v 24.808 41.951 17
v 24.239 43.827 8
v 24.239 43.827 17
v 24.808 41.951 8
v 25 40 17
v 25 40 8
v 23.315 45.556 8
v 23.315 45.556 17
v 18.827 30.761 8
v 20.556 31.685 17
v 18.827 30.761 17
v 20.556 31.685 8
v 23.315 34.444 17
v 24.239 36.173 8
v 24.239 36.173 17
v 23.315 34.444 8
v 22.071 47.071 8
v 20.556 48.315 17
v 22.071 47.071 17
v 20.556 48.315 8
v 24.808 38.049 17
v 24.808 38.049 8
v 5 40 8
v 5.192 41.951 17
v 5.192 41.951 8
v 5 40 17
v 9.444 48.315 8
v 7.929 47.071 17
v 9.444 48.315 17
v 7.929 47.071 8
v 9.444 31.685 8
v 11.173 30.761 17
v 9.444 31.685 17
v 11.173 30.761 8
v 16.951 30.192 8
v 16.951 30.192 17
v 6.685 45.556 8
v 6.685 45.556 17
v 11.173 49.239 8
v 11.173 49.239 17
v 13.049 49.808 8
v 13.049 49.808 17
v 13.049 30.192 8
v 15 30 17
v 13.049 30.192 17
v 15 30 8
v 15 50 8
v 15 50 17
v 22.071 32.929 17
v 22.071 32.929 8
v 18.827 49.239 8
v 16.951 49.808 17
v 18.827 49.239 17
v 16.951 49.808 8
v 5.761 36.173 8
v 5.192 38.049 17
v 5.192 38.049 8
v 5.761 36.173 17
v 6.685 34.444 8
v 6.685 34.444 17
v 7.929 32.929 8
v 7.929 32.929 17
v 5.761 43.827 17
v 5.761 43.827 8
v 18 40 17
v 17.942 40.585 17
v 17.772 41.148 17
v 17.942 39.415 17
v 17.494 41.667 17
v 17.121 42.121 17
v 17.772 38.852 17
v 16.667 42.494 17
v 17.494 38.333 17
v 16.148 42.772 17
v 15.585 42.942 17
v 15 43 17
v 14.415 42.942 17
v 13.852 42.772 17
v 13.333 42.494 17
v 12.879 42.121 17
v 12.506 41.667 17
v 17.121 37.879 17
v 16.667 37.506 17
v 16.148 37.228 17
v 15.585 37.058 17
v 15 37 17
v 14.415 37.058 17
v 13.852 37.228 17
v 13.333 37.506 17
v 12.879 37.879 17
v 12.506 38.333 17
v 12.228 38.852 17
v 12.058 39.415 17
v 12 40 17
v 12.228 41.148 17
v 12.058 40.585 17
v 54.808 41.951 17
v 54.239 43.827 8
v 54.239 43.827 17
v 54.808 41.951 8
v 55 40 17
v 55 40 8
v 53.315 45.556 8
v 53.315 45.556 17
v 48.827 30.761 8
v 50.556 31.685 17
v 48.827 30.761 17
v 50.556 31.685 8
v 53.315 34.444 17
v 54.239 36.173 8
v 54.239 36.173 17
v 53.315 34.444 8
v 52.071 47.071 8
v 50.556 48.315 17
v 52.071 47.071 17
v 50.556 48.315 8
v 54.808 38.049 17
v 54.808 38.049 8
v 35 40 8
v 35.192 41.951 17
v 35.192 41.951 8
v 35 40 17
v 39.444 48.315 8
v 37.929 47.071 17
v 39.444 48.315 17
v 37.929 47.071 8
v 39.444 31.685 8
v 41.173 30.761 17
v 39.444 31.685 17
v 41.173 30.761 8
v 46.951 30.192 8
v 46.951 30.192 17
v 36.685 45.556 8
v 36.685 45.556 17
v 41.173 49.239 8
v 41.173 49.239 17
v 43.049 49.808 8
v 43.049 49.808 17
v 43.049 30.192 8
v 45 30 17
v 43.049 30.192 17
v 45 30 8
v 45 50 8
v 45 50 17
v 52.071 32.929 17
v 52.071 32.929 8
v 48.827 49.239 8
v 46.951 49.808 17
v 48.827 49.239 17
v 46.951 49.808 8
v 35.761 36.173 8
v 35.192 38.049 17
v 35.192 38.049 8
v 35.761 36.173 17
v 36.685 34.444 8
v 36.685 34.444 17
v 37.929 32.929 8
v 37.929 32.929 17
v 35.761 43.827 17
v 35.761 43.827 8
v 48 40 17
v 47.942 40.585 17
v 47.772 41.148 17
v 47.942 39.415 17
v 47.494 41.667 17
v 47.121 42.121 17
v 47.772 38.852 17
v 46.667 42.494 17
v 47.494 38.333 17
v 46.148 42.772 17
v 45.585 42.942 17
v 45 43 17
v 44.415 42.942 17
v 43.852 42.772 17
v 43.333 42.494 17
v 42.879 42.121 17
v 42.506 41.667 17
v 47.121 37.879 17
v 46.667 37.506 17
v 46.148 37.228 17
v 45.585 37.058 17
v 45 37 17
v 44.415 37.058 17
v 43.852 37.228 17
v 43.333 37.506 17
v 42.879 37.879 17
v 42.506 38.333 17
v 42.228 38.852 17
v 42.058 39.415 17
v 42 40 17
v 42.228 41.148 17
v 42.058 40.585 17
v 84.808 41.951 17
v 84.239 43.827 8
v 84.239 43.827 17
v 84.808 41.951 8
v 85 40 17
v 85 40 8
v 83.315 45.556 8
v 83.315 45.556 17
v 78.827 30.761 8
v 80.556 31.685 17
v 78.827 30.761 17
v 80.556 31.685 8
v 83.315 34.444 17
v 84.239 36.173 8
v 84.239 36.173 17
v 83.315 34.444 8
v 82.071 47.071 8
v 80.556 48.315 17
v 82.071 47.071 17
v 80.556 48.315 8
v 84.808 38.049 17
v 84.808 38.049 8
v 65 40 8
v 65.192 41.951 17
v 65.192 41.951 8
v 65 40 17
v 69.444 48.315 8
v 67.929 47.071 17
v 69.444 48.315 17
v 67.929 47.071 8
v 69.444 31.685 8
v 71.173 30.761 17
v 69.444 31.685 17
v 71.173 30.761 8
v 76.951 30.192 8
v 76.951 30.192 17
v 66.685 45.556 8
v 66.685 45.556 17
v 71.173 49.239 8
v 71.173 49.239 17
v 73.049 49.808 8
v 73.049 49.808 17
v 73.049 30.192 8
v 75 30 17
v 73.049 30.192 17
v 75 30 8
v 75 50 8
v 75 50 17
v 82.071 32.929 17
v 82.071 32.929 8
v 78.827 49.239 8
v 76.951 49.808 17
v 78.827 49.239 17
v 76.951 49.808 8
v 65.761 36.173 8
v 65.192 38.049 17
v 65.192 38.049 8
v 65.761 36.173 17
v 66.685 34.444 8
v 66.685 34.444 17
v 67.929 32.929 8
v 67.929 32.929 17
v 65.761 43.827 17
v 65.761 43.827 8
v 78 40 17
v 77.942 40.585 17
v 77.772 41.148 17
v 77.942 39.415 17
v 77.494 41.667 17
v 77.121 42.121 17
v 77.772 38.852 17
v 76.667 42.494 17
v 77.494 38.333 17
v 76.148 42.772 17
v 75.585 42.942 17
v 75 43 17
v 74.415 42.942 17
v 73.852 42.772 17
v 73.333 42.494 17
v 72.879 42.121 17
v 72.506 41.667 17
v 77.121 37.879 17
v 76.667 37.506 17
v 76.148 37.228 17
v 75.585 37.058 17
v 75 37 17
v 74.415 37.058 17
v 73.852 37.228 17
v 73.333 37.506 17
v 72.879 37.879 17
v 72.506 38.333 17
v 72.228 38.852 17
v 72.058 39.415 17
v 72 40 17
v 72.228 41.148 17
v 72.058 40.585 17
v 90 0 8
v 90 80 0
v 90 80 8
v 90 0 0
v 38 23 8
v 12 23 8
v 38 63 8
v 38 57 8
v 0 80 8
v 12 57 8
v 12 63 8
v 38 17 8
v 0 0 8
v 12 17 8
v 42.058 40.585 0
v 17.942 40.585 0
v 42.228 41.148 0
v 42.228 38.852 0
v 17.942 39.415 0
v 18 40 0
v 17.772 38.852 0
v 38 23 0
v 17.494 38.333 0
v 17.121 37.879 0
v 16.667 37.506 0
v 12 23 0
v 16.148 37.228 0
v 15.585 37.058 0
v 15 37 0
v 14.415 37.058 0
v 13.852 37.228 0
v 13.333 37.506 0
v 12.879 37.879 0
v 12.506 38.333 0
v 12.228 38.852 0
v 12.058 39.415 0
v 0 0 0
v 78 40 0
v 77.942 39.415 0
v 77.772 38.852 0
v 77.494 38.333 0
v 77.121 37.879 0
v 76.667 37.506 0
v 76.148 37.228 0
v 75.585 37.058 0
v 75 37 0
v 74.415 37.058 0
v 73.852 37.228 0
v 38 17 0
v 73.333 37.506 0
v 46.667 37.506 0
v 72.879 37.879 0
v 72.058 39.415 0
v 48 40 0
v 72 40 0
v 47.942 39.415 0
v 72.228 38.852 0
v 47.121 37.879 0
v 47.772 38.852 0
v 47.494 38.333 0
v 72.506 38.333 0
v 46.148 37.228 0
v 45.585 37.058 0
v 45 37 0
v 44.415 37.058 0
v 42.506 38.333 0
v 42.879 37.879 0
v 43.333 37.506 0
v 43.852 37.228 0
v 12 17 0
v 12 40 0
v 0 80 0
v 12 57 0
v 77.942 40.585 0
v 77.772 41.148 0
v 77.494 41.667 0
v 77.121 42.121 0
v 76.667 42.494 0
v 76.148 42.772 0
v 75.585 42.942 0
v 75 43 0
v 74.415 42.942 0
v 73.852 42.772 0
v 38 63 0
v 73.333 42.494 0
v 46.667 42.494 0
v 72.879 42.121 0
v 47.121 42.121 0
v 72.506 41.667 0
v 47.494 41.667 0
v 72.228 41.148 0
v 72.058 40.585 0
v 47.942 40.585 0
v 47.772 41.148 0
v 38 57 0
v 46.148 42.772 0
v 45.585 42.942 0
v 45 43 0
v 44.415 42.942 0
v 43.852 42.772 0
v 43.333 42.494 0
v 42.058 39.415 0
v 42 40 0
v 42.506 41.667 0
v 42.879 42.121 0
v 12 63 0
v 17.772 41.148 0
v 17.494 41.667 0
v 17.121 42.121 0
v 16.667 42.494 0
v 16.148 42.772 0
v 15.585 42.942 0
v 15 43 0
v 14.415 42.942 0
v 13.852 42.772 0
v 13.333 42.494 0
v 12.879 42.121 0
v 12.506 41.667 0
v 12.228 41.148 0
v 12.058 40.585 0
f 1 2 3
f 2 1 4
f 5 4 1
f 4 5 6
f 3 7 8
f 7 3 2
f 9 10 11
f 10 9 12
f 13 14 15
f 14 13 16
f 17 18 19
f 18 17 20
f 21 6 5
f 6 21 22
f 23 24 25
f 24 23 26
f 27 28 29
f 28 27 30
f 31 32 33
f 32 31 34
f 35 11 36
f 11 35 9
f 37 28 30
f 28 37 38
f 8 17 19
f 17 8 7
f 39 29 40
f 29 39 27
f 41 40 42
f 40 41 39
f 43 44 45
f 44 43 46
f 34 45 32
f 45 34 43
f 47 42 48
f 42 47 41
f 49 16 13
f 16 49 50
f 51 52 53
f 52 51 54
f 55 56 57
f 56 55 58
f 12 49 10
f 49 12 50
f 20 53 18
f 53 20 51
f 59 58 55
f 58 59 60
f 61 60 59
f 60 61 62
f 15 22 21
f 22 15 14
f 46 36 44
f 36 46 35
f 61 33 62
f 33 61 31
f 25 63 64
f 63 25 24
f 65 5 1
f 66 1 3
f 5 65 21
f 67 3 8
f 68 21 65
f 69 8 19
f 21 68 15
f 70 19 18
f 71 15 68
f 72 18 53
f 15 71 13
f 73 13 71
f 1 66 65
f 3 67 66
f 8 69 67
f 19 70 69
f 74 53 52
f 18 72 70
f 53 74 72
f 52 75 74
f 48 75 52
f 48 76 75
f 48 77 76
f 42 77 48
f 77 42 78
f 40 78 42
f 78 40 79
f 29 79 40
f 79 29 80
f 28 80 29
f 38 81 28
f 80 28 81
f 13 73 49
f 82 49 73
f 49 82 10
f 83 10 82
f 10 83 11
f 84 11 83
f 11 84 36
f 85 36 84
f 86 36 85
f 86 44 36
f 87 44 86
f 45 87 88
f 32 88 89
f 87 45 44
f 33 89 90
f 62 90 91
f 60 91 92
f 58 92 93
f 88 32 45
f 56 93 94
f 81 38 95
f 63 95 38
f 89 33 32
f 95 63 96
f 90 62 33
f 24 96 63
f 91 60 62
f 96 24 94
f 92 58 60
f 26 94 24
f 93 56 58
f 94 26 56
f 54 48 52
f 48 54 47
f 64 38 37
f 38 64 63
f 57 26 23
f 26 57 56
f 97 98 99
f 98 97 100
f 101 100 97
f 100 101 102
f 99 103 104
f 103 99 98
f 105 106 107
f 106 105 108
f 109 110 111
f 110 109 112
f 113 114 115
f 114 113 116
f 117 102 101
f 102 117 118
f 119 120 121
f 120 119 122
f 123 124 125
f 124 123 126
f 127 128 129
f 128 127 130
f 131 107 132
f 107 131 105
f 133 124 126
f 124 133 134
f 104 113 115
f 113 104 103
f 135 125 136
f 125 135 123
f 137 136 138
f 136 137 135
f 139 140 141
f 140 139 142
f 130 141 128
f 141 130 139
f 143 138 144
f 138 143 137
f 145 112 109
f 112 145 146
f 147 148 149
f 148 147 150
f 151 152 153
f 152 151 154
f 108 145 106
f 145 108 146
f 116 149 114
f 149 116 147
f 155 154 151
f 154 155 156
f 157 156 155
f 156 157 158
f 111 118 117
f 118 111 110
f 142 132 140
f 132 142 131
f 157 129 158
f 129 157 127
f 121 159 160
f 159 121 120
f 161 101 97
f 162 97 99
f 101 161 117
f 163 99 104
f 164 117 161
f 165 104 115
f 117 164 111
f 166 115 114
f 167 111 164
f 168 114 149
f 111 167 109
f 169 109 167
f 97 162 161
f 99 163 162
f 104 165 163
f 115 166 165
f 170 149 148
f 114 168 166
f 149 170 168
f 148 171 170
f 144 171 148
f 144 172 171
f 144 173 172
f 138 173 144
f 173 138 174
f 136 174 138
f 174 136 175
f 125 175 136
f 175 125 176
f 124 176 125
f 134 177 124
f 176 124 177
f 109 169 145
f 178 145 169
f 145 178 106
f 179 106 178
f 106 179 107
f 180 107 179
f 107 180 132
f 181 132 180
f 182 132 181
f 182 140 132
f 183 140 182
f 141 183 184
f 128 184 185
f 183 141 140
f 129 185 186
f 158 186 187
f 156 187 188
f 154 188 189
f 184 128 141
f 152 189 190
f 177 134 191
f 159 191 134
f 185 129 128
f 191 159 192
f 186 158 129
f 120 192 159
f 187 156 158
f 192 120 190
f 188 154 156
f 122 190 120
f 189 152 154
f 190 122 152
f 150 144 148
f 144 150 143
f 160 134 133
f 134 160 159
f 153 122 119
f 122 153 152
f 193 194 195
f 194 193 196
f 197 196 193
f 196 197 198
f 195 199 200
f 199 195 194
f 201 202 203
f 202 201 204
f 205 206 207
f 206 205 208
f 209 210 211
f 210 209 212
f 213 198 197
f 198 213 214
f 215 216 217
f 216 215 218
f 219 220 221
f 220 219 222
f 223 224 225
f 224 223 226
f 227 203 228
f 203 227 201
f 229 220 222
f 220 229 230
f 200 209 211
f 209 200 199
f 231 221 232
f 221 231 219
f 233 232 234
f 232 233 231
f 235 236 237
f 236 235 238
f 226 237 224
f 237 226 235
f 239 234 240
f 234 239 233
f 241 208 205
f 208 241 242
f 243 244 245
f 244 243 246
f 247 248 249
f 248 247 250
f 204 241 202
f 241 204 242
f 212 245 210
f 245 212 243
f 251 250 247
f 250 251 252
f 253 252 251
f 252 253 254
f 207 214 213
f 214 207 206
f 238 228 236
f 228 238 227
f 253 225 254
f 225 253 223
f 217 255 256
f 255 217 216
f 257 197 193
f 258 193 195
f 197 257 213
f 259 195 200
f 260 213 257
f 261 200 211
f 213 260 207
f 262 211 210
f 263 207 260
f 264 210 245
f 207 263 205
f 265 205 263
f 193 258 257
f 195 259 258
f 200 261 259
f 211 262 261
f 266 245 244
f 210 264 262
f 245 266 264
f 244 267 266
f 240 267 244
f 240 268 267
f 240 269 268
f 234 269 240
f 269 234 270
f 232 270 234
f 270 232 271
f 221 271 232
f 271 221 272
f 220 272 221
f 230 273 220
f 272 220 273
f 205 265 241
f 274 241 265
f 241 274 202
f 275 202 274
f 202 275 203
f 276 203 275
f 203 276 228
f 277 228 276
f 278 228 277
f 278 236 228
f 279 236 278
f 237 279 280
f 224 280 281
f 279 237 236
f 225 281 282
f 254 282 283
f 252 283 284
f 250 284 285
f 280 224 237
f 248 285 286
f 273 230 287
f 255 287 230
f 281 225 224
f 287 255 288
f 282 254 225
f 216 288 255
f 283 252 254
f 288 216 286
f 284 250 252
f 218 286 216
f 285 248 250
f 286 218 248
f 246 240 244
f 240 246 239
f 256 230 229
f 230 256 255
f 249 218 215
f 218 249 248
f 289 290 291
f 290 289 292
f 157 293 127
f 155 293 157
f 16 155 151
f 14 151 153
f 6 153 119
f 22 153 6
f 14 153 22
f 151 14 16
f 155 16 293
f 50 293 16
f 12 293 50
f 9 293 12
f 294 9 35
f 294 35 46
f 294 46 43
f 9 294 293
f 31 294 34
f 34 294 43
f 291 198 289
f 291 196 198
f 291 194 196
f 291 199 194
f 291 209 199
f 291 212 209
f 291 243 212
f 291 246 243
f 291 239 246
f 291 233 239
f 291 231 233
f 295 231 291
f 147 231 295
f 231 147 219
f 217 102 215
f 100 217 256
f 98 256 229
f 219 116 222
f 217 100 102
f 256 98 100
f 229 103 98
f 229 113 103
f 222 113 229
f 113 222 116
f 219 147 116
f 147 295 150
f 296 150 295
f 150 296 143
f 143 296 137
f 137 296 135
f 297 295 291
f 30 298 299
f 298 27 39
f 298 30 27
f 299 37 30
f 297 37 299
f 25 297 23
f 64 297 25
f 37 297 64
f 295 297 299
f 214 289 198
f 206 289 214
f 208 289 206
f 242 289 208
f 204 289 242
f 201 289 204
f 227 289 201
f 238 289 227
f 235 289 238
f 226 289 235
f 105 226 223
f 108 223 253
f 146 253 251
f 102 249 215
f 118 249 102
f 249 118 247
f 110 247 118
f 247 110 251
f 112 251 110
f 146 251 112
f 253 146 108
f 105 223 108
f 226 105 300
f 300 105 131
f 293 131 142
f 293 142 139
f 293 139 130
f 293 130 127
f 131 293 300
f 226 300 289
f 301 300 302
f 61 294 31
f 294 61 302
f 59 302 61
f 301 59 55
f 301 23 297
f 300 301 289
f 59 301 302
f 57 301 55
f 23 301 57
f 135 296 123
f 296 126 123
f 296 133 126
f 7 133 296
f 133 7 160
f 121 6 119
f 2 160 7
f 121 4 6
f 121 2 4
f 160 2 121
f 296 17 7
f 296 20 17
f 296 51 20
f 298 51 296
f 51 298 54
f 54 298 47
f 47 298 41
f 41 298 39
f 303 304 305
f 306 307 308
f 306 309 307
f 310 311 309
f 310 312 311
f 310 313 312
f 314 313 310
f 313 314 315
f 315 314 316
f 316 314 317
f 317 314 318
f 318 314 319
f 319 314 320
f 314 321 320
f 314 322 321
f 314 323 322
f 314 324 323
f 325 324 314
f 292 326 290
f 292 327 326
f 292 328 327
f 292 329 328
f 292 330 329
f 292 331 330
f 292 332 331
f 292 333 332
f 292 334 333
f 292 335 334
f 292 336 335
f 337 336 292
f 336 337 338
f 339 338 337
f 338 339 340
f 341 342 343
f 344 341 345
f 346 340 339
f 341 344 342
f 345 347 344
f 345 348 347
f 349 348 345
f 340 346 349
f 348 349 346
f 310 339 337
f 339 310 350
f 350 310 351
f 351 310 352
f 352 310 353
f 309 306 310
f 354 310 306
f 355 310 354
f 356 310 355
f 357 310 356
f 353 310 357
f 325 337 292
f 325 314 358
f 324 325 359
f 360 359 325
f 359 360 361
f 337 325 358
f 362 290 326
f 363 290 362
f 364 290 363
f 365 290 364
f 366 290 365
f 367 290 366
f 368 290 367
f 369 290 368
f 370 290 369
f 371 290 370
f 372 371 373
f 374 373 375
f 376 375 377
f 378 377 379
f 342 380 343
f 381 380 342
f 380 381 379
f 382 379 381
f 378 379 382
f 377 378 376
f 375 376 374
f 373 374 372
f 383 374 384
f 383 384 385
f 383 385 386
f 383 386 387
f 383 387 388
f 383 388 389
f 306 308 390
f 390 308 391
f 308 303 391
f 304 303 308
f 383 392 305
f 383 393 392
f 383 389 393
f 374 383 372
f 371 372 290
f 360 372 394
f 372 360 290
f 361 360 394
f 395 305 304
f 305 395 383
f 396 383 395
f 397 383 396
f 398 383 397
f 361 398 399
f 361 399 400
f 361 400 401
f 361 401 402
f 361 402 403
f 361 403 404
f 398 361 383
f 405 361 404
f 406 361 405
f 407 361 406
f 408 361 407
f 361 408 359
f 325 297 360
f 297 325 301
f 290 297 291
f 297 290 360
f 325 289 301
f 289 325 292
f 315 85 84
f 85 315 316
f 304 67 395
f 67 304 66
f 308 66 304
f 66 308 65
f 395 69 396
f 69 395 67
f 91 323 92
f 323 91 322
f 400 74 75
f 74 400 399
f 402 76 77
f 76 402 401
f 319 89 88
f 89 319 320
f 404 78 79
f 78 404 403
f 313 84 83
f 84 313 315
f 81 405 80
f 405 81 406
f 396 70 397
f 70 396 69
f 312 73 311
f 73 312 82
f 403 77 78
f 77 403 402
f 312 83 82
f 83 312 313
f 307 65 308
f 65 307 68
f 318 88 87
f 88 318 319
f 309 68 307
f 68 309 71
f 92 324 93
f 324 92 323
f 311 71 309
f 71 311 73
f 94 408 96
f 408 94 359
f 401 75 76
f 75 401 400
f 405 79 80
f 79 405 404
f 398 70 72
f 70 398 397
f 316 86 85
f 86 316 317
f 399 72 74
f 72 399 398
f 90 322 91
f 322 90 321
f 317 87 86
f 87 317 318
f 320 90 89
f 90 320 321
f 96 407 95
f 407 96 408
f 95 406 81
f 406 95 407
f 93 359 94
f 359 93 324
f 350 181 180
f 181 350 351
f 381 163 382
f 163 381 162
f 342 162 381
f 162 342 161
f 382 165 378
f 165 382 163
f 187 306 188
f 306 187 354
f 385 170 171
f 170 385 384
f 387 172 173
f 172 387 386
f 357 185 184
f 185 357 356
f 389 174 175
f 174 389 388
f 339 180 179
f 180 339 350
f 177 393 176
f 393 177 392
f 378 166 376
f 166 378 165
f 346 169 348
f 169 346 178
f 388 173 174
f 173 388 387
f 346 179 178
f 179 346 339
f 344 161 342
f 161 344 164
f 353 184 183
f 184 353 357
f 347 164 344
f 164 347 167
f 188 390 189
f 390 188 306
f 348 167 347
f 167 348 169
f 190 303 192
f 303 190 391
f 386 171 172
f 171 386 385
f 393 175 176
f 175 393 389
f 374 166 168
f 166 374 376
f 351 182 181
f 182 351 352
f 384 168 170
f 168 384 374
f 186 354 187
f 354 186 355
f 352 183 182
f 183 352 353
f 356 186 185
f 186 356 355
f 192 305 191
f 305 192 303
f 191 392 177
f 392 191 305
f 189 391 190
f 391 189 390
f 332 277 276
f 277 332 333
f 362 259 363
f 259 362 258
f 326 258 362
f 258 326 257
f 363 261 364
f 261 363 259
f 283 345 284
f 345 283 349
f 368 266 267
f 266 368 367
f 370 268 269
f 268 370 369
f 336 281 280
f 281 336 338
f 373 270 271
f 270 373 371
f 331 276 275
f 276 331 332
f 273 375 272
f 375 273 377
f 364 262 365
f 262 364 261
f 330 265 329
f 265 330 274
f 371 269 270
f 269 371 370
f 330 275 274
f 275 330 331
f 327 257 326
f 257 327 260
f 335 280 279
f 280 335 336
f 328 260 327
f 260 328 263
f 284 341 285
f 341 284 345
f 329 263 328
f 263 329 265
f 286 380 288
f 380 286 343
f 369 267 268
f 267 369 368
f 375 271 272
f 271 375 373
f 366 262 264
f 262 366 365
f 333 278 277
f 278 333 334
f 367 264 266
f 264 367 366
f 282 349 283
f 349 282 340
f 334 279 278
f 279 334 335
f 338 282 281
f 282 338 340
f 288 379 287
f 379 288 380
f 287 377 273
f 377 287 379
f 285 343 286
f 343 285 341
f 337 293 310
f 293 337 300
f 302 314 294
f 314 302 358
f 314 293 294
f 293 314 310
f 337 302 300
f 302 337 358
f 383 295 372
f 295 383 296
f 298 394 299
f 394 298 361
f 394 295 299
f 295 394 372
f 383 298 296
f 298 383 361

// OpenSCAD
$fn = 32;

// ----------------------------------------------------------------------
// Drill jig: three_boss_slot jig
// ----------------------------------------------------------------------

// --- parameters (mm) ---
plate_l = 90;             // plate length, X
plate_w = 80;             // plate width, Y
plate_t = 8;              // plate thickness
boss_d = 20;              // guide boss diameter
boss_h = 10;              // boss height above the plate
guide_d = 6;              // guide hole diameter
boss_pitch = 30;          // boss pitch
slot_w = 6;               // clamp slot width
slot_l = 26;              // clamp slot length
slot_x = 12;              // slot start X

n_boss = 3;  // guide bosses
boss_x0 = (plate_l - (n_boss - 1) * boss_pitch) / 2;  // first boss X
boss_top = plate_t - 1 + boss_h;  // boss crown height
total_h = boss_top;  // overall height

difference() {
  union() {
  cube([plate_l, plate_w, plate_t]);
  for (i = [0 : n_boss - 1])
    translate([boss_x0 + i * boss_pitch, plate_w / 2, plate_t - 1])
      cylinder(h = boss_h, d = boss_d);
  }
  for (i = [0 : n_boss - 1])
    translate([boss_x0 + i * boss_pitch, plate_w / 2, -1])
      cylinder(h = plate_t + boss_h, d = guide_d);
  for (cy = [plate_w * 0.25, plate_w * 0.75])
    translate([slot_x, cy - slot_w / 2, -1])
      cube([slot_l, slot_w, plate_t + 2]);
}
